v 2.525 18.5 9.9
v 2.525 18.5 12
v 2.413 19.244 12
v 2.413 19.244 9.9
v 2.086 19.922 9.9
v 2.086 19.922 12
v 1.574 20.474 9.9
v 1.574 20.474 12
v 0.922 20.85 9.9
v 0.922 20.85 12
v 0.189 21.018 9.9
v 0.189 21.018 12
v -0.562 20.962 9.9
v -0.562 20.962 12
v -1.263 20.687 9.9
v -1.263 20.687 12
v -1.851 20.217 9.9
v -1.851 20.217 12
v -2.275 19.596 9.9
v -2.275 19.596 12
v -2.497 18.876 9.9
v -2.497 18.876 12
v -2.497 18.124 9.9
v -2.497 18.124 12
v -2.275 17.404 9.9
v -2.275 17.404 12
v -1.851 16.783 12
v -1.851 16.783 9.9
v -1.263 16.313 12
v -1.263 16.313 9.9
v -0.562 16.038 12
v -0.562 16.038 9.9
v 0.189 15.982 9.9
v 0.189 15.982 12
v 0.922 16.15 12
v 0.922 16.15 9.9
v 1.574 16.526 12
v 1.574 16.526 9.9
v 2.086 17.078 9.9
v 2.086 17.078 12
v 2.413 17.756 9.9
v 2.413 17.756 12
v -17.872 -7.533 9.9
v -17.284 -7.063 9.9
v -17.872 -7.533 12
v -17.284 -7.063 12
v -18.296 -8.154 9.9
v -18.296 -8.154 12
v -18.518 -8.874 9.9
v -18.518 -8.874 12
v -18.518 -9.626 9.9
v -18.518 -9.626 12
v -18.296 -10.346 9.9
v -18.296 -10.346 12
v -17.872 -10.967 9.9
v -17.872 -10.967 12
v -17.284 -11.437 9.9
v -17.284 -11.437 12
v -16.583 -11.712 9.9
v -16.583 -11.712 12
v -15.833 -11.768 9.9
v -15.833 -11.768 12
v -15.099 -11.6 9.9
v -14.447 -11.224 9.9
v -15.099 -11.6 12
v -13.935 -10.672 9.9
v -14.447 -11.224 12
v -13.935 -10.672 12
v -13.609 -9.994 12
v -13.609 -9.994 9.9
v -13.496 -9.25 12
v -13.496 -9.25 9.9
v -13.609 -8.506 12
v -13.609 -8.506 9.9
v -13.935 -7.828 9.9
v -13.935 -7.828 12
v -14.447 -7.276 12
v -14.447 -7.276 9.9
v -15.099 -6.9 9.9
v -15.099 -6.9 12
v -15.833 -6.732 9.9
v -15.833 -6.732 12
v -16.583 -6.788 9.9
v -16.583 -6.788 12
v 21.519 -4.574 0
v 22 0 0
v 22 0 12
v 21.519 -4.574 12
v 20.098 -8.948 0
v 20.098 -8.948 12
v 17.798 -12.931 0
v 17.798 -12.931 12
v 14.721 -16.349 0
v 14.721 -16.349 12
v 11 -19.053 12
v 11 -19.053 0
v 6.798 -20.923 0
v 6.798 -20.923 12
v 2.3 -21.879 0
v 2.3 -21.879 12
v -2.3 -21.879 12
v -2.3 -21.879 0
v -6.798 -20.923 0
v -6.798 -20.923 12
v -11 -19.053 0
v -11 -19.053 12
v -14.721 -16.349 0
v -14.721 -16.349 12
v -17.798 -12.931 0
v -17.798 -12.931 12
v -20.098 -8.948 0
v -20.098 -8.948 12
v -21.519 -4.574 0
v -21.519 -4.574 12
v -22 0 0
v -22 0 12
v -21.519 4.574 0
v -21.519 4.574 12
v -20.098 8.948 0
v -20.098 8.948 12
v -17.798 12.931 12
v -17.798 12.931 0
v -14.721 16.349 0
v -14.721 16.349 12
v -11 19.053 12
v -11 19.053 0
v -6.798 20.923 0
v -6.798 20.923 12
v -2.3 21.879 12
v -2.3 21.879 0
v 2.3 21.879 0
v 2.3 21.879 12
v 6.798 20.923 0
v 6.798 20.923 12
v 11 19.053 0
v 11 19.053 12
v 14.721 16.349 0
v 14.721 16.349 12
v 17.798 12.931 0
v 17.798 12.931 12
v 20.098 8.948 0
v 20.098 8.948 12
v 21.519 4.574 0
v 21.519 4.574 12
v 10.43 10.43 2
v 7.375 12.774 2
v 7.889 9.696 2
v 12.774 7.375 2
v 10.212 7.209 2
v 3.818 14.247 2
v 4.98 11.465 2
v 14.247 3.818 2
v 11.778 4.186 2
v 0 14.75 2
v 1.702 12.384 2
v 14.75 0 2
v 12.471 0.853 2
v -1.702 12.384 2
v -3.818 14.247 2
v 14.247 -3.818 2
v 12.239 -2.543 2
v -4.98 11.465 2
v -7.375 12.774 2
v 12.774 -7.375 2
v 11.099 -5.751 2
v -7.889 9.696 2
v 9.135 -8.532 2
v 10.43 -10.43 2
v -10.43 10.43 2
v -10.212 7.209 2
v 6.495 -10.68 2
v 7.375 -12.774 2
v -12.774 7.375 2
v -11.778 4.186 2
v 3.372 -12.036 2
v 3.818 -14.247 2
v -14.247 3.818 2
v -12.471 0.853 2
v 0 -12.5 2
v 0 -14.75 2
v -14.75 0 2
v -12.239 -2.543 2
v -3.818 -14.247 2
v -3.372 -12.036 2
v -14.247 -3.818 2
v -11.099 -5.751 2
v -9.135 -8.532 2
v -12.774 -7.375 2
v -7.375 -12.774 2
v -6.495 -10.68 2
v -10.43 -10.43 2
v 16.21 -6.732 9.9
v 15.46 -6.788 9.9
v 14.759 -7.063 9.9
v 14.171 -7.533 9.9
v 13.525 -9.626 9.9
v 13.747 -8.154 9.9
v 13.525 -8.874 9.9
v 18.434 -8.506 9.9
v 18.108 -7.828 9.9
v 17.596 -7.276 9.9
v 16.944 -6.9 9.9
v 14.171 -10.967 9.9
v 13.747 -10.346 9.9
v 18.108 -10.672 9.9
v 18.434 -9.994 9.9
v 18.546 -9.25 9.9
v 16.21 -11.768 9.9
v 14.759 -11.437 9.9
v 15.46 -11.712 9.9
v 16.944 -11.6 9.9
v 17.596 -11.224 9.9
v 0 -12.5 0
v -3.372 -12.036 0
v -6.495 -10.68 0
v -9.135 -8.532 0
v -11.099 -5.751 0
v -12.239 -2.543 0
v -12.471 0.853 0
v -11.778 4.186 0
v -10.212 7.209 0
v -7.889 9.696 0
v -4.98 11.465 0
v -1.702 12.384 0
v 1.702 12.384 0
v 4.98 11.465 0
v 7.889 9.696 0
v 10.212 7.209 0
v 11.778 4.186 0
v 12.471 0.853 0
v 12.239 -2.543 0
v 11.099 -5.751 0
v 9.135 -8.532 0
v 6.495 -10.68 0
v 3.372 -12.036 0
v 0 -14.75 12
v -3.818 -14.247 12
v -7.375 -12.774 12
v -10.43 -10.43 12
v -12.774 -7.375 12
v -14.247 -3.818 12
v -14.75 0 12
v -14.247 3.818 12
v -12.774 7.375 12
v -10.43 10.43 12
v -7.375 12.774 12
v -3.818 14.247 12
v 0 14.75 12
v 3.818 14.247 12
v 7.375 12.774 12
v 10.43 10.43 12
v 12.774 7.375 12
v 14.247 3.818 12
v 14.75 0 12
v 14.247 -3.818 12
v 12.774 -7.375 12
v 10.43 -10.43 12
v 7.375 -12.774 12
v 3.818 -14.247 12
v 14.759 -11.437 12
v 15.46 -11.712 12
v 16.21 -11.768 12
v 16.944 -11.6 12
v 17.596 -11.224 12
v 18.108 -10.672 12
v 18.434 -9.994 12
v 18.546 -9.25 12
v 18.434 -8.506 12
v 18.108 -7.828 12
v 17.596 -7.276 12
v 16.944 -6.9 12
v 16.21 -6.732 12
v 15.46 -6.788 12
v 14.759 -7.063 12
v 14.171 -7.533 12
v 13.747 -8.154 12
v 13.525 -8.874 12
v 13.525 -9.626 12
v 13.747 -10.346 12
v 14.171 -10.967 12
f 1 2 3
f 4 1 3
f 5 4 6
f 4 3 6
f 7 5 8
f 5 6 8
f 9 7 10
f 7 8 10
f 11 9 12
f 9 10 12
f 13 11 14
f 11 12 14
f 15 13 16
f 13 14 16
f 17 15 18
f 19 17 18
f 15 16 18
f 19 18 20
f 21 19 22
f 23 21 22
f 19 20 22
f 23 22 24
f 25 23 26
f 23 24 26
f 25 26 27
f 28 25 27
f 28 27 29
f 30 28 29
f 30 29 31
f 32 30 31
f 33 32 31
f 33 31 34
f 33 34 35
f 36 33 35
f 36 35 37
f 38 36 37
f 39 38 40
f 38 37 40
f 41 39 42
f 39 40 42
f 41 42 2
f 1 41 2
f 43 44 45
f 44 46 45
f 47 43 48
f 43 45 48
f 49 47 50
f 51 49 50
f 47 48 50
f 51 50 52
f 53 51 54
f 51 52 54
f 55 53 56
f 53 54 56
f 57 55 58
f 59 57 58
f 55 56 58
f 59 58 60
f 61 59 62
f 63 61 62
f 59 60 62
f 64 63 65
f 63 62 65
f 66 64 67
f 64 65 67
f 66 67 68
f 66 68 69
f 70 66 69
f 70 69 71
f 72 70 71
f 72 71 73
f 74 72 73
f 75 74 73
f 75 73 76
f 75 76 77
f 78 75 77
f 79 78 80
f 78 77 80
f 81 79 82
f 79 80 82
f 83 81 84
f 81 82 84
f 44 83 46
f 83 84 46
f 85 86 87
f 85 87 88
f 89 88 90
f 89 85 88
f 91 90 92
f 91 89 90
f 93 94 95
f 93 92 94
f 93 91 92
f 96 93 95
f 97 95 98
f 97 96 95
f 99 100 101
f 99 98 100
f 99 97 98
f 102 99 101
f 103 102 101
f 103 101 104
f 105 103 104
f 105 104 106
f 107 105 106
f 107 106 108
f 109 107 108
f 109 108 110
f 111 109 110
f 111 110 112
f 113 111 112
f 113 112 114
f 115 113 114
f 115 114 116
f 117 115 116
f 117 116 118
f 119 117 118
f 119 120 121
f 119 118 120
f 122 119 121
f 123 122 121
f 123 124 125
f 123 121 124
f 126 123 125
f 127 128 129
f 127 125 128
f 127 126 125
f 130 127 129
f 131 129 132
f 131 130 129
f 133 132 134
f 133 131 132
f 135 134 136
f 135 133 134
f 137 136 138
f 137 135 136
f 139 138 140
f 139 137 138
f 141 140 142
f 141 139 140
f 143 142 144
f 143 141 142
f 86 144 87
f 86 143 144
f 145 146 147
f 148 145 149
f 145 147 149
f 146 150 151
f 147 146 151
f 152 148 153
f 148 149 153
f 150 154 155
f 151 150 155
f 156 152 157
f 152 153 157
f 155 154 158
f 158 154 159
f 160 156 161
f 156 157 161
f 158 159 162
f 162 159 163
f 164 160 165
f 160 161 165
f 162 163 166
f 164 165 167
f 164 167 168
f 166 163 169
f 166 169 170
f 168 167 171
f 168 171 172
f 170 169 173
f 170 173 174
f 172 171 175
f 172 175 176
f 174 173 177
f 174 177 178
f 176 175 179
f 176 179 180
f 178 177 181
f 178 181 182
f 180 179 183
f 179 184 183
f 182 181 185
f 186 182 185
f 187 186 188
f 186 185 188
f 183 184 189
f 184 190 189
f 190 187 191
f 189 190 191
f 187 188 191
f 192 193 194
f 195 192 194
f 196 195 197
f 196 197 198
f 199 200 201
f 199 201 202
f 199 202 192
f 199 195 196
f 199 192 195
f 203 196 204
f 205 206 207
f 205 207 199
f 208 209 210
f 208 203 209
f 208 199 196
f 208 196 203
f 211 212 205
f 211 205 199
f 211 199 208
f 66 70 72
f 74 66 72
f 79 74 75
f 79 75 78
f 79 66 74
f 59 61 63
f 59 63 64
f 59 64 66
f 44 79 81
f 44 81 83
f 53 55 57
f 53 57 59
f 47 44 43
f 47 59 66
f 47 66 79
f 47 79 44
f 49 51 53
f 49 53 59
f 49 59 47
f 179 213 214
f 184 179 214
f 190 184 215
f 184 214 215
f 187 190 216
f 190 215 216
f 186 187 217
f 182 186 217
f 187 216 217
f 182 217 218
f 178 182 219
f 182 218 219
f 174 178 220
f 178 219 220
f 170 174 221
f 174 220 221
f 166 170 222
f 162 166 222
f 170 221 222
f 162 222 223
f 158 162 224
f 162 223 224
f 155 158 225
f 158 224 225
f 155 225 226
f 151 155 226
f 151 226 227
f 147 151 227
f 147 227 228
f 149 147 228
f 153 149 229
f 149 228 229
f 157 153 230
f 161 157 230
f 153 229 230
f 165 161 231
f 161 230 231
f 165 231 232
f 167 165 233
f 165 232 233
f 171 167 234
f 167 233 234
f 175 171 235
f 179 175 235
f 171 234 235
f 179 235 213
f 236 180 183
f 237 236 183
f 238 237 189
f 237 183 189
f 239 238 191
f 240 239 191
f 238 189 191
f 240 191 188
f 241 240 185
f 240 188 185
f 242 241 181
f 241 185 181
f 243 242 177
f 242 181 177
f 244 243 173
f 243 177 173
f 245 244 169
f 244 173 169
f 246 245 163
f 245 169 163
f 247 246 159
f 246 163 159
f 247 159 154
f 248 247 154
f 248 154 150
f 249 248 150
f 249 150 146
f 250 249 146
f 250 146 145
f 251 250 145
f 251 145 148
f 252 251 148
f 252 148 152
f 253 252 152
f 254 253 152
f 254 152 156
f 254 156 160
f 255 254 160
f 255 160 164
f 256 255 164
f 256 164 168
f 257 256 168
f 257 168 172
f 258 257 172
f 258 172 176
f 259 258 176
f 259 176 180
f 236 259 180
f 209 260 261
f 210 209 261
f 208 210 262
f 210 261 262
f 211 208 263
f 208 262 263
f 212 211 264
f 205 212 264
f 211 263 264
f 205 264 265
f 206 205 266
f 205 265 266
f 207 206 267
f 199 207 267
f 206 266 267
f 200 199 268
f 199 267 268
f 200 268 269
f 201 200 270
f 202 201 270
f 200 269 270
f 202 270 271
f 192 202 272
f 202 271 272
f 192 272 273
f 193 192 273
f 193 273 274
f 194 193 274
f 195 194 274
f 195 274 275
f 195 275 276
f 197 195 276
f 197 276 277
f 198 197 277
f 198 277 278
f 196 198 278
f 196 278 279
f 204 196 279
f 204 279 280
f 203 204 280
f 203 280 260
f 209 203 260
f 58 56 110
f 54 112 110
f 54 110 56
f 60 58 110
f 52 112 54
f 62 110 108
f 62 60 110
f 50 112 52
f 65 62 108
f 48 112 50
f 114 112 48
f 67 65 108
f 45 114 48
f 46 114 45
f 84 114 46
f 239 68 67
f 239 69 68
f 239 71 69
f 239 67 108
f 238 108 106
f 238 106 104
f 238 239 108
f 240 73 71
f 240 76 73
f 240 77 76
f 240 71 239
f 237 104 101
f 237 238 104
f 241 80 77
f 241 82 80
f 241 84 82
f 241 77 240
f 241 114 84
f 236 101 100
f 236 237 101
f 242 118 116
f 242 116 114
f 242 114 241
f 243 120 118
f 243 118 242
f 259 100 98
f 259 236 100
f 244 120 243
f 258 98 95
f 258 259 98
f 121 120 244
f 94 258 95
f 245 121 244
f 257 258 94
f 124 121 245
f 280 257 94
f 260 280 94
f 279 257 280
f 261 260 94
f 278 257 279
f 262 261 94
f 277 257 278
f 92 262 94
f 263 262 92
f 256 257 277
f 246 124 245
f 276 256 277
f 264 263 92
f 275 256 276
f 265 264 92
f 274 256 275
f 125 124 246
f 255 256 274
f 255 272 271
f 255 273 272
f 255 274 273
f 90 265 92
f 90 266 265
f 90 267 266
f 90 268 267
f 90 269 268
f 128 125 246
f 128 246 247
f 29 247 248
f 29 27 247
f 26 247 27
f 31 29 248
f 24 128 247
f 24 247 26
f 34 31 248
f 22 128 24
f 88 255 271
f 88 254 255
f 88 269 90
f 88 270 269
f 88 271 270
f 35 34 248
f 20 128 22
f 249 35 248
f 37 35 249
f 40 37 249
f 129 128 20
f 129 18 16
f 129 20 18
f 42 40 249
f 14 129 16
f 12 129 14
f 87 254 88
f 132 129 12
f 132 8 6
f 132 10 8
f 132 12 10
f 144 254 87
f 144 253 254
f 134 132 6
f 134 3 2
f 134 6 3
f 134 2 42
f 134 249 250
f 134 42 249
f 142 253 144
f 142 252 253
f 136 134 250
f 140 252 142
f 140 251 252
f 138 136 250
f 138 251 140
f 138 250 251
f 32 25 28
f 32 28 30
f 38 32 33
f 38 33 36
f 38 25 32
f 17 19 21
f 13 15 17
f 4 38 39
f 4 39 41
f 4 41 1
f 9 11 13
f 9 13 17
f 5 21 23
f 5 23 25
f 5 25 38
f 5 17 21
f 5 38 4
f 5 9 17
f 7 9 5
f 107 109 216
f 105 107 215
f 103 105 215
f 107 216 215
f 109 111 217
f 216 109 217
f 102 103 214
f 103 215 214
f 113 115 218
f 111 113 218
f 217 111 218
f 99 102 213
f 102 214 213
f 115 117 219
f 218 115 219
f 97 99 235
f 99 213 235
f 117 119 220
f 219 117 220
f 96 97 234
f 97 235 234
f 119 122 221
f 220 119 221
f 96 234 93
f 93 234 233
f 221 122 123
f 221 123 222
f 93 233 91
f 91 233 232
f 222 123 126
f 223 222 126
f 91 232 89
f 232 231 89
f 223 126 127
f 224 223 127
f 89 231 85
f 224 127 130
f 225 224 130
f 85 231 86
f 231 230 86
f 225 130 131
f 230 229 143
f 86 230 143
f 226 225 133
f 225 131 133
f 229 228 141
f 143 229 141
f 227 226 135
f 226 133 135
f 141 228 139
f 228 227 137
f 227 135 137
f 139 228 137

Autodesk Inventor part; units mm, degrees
ref_plane "YZ Plane" through (0, 0, 0) normal (1, 0, 0) x (0, 1, 0)
ref_plane "XZ Plane" through (0, 0, 0) normal (0, 1, 0) x (-1, 0, 0)
ref_plane "XY Plane" through (0, 0, 0) normal (0, 0, 1) x (1, 0, 0)
sketch "Skizze1" plane through (0, 0, 0) normal (0, 0, 1) x (1, 0, 0)
  circle A0 centre (0, 0) radius 22
  dimension "d0" = 44
extrude "Extrusion1" add sketch "Skizze1" along normal blind 12
sketch "Skizze2" plane through (0, 0, 12) normal (0, 0, 1) x (1, 0, 0)
  circle A0 centre (0, 18.5) radius 2.525
  point P0 (0, 0)
  dimension "d3" = 5.05
  dimension "d4" = 18.5
extrude "Extrusion2" cut sketch "Skizze2" against normal blind 2.1
pattern_circular "Runde Anordnung1" count 3 over 360 about axis through (0, 0, 0) along (0, 0, 1) of "Extrusion2"
hole "Bohrung1" at (0, 0, 12) direction (0, 0, -1) diameter 25 depth 12 counterbore diameter 29.5 counterbore depth 10
properties part number "Sensor Deckel293"
